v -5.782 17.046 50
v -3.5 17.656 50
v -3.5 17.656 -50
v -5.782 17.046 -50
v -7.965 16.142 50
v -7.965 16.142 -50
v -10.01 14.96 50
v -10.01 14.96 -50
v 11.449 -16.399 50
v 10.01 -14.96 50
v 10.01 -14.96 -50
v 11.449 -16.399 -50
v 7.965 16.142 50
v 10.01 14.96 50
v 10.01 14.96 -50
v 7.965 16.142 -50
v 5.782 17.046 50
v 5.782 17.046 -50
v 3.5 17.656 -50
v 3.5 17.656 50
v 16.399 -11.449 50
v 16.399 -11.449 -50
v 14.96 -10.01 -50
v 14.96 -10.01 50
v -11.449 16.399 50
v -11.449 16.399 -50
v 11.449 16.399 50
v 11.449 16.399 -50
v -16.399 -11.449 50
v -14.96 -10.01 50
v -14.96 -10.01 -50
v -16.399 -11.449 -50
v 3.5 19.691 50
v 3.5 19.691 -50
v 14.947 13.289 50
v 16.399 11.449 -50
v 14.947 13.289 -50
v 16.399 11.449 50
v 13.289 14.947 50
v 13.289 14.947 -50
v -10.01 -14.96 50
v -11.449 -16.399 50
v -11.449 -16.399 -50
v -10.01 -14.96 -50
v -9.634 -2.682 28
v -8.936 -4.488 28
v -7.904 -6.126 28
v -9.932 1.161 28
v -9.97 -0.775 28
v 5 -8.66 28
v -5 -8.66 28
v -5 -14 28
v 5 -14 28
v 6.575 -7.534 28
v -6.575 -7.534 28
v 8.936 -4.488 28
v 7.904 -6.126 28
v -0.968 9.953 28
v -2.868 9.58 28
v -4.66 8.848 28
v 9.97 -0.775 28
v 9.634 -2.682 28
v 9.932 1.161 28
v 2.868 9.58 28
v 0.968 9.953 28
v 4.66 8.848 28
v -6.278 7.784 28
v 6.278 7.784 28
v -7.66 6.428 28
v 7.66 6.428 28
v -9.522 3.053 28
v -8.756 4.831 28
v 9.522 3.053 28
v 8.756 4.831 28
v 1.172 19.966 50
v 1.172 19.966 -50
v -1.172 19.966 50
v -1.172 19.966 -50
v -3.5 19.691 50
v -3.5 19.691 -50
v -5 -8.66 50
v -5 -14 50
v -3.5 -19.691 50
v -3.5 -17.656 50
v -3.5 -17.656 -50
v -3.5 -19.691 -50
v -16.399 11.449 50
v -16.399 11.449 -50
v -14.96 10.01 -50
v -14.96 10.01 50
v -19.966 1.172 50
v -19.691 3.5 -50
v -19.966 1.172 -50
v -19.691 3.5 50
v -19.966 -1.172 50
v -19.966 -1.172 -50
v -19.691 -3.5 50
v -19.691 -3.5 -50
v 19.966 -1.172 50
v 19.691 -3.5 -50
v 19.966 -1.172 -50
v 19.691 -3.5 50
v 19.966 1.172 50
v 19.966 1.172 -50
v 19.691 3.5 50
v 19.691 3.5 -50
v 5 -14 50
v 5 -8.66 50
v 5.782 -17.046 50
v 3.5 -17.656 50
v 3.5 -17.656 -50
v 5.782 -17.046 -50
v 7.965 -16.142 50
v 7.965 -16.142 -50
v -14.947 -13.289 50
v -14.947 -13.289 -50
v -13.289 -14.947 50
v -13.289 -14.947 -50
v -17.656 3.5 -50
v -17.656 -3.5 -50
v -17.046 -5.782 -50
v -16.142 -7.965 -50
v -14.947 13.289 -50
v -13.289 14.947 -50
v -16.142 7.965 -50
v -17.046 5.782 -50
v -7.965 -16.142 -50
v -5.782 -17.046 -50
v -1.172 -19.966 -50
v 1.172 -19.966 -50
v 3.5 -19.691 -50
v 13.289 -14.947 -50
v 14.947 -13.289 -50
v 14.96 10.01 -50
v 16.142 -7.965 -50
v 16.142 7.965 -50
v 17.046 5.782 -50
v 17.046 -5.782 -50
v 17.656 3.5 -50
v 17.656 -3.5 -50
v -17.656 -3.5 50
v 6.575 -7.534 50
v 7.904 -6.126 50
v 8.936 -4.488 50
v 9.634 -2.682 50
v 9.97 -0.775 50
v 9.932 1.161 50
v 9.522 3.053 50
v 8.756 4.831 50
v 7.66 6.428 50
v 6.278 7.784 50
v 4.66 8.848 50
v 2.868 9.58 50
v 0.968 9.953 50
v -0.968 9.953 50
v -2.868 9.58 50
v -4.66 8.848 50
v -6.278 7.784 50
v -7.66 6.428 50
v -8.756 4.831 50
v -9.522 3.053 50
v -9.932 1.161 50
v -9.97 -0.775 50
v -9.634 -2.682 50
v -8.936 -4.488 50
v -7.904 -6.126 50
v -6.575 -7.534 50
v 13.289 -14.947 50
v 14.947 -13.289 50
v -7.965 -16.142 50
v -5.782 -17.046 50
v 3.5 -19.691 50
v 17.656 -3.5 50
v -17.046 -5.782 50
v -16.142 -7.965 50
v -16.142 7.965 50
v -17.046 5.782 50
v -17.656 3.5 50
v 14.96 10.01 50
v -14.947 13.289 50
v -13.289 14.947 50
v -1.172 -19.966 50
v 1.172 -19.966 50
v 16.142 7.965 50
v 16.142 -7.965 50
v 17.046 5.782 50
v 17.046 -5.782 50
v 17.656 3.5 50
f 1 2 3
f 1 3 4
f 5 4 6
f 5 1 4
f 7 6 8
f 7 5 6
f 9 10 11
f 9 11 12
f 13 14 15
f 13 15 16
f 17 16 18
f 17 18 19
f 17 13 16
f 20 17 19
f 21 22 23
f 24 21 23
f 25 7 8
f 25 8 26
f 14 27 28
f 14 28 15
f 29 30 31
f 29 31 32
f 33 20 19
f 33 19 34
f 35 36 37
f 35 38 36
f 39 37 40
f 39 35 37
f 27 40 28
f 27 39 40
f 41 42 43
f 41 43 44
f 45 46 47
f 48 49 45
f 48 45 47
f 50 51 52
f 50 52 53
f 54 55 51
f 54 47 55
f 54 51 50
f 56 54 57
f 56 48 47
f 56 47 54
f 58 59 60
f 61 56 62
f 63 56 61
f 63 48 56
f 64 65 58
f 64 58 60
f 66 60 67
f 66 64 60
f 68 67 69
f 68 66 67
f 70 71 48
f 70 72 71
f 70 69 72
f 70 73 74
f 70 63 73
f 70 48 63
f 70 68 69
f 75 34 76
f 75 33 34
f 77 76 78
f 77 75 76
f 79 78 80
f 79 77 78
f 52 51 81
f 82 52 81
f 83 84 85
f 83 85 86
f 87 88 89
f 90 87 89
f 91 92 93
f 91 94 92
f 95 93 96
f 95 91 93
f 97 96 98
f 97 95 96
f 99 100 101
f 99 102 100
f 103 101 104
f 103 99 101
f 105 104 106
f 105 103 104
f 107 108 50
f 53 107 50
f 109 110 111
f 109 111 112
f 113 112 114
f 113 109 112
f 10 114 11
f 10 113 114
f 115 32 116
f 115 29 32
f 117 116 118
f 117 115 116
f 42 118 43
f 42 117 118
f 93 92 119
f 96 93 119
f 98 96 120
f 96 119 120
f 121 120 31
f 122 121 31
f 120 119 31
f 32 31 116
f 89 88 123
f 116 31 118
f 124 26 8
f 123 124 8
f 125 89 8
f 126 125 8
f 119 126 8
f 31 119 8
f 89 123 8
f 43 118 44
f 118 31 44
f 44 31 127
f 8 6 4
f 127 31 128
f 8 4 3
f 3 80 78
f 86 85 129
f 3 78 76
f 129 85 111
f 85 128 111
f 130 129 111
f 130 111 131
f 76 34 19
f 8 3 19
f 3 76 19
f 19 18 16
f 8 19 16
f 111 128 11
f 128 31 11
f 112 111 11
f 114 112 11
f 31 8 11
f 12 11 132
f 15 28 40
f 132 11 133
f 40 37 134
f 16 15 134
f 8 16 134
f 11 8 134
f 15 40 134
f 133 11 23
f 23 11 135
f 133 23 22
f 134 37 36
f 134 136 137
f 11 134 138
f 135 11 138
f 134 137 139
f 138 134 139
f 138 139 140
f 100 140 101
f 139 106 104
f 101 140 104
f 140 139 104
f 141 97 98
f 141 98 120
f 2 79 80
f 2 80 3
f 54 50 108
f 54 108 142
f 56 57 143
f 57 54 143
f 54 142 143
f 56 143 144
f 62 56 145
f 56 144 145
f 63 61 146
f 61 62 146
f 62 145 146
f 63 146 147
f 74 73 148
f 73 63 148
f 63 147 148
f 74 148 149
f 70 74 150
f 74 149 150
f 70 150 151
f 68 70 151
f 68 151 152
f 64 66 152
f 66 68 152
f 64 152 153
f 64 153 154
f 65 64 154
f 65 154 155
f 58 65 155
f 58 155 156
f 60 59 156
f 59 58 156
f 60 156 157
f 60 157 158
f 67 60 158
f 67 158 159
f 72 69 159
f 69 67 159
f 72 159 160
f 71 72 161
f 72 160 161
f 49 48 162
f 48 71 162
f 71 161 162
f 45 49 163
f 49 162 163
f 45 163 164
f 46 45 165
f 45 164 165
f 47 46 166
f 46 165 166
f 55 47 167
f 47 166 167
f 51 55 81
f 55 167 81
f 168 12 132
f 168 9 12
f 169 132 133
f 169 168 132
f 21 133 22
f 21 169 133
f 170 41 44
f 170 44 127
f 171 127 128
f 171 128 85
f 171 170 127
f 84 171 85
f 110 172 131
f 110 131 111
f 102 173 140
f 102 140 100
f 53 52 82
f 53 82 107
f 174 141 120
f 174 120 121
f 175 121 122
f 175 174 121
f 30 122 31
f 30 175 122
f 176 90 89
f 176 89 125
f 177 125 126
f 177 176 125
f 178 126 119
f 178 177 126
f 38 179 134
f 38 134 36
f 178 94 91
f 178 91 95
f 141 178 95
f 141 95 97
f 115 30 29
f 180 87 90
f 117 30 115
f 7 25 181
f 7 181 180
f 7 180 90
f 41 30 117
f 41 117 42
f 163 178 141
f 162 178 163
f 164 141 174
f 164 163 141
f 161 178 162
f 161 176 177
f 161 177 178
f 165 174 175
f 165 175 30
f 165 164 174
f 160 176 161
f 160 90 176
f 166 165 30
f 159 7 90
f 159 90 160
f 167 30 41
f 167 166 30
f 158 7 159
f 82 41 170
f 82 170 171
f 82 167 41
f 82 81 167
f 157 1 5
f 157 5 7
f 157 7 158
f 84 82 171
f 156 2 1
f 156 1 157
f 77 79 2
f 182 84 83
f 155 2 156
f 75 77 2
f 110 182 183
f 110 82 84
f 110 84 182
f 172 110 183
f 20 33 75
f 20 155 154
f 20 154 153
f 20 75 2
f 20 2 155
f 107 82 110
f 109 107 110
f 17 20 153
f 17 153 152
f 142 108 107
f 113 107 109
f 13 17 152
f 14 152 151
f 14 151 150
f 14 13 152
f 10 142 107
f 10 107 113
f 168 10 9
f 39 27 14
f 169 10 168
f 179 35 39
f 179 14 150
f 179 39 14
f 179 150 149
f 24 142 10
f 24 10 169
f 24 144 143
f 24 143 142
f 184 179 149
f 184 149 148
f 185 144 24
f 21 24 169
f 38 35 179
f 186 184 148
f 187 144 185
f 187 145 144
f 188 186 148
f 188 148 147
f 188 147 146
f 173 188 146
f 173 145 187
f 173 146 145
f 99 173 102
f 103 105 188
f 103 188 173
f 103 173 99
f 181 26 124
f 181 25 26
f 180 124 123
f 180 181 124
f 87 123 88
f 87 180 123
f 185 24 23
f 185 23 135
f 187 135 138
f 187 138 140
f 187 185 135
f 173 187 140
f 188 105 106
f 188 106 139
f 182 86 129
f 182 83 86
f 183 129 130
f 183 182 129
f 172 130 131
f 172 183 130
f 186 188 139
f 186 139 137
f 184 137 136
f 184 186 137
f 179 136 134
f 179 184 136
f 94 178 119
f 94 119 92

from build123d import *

# Parameters (mm, degrees)
SKETCH1_R           = 18
BASEKEY_DEPTH       = 50
RECTANGLE_DEPTH     = 50
RECTANGLEPAT_COUNT  = 8
SKETCH_1_R          = 10
CUT_EXTRUDE_1_DEPTH = 22
CUT_EXTRUDE_2_DEPTH = 14


with BuildPart() as part:
    # Sketch1 → BaseKey (new, symmetric)
    with BuildSketch(Plane.XY):
        Circle(SKETCH1_R)
    extrude(amount=BASEKEY_DEPTH, both=True)

    # Sketch2 → Rectangle (add, symmetric)
    with BuildSketch(Plane.XY):
        with BuildLine():
            Line((-3.5, 19.691368668), (-3.5, 0))
            Line((-3.5, 0), (3.5, 0))
            Line((3.5, 0), (3.5, 19.691368668))
            ThreePointArc((3.5, 19.691368668), (0, 20), (-3.5, 19.691368668))
        make_face()
    rectangle = extrude(amount=RECTANGLE_DEPTH, both=True)

    # RectanglePat: Rectangle ×8 about axis
    rectanglepat_axis = Axis((0, 0, 0), (0, 0, 1))
    for i in range(1, RECTANGLEPAT_COUNT):
        add(rectangle.rotate(rectanglepat_axis, i * 360 / RECTANGLEPAT_COUNT))

    # 草图1 → 切除-拉伸1 (cut)
    with BuildSketch(Plane.XY.offset(50)):
        Circle(SKETCH_1_R)
    extrude(amount=-CUT_EXTRUDE_1_DEPTH, mode=Mode.SUBTRACT)

    # 草图2 → 切除-拉伸2 (cut)
    with BuildSketch(Plane(origin=(0, 0, 0), x_dir=(1, 0, 0), z_dir=(0, 1, 0))):
        Polygon((0, -50), (5, -50), (5, -43), (5, -36), (5, -28), (-5, -28), (-5, -36), (-5, -43), (-5, -50), align=None)
    extrude(amount=-CUT_EXTRUDE_2_DEPTH, mode=Mode.SUBTRACT)


solid = part.part
